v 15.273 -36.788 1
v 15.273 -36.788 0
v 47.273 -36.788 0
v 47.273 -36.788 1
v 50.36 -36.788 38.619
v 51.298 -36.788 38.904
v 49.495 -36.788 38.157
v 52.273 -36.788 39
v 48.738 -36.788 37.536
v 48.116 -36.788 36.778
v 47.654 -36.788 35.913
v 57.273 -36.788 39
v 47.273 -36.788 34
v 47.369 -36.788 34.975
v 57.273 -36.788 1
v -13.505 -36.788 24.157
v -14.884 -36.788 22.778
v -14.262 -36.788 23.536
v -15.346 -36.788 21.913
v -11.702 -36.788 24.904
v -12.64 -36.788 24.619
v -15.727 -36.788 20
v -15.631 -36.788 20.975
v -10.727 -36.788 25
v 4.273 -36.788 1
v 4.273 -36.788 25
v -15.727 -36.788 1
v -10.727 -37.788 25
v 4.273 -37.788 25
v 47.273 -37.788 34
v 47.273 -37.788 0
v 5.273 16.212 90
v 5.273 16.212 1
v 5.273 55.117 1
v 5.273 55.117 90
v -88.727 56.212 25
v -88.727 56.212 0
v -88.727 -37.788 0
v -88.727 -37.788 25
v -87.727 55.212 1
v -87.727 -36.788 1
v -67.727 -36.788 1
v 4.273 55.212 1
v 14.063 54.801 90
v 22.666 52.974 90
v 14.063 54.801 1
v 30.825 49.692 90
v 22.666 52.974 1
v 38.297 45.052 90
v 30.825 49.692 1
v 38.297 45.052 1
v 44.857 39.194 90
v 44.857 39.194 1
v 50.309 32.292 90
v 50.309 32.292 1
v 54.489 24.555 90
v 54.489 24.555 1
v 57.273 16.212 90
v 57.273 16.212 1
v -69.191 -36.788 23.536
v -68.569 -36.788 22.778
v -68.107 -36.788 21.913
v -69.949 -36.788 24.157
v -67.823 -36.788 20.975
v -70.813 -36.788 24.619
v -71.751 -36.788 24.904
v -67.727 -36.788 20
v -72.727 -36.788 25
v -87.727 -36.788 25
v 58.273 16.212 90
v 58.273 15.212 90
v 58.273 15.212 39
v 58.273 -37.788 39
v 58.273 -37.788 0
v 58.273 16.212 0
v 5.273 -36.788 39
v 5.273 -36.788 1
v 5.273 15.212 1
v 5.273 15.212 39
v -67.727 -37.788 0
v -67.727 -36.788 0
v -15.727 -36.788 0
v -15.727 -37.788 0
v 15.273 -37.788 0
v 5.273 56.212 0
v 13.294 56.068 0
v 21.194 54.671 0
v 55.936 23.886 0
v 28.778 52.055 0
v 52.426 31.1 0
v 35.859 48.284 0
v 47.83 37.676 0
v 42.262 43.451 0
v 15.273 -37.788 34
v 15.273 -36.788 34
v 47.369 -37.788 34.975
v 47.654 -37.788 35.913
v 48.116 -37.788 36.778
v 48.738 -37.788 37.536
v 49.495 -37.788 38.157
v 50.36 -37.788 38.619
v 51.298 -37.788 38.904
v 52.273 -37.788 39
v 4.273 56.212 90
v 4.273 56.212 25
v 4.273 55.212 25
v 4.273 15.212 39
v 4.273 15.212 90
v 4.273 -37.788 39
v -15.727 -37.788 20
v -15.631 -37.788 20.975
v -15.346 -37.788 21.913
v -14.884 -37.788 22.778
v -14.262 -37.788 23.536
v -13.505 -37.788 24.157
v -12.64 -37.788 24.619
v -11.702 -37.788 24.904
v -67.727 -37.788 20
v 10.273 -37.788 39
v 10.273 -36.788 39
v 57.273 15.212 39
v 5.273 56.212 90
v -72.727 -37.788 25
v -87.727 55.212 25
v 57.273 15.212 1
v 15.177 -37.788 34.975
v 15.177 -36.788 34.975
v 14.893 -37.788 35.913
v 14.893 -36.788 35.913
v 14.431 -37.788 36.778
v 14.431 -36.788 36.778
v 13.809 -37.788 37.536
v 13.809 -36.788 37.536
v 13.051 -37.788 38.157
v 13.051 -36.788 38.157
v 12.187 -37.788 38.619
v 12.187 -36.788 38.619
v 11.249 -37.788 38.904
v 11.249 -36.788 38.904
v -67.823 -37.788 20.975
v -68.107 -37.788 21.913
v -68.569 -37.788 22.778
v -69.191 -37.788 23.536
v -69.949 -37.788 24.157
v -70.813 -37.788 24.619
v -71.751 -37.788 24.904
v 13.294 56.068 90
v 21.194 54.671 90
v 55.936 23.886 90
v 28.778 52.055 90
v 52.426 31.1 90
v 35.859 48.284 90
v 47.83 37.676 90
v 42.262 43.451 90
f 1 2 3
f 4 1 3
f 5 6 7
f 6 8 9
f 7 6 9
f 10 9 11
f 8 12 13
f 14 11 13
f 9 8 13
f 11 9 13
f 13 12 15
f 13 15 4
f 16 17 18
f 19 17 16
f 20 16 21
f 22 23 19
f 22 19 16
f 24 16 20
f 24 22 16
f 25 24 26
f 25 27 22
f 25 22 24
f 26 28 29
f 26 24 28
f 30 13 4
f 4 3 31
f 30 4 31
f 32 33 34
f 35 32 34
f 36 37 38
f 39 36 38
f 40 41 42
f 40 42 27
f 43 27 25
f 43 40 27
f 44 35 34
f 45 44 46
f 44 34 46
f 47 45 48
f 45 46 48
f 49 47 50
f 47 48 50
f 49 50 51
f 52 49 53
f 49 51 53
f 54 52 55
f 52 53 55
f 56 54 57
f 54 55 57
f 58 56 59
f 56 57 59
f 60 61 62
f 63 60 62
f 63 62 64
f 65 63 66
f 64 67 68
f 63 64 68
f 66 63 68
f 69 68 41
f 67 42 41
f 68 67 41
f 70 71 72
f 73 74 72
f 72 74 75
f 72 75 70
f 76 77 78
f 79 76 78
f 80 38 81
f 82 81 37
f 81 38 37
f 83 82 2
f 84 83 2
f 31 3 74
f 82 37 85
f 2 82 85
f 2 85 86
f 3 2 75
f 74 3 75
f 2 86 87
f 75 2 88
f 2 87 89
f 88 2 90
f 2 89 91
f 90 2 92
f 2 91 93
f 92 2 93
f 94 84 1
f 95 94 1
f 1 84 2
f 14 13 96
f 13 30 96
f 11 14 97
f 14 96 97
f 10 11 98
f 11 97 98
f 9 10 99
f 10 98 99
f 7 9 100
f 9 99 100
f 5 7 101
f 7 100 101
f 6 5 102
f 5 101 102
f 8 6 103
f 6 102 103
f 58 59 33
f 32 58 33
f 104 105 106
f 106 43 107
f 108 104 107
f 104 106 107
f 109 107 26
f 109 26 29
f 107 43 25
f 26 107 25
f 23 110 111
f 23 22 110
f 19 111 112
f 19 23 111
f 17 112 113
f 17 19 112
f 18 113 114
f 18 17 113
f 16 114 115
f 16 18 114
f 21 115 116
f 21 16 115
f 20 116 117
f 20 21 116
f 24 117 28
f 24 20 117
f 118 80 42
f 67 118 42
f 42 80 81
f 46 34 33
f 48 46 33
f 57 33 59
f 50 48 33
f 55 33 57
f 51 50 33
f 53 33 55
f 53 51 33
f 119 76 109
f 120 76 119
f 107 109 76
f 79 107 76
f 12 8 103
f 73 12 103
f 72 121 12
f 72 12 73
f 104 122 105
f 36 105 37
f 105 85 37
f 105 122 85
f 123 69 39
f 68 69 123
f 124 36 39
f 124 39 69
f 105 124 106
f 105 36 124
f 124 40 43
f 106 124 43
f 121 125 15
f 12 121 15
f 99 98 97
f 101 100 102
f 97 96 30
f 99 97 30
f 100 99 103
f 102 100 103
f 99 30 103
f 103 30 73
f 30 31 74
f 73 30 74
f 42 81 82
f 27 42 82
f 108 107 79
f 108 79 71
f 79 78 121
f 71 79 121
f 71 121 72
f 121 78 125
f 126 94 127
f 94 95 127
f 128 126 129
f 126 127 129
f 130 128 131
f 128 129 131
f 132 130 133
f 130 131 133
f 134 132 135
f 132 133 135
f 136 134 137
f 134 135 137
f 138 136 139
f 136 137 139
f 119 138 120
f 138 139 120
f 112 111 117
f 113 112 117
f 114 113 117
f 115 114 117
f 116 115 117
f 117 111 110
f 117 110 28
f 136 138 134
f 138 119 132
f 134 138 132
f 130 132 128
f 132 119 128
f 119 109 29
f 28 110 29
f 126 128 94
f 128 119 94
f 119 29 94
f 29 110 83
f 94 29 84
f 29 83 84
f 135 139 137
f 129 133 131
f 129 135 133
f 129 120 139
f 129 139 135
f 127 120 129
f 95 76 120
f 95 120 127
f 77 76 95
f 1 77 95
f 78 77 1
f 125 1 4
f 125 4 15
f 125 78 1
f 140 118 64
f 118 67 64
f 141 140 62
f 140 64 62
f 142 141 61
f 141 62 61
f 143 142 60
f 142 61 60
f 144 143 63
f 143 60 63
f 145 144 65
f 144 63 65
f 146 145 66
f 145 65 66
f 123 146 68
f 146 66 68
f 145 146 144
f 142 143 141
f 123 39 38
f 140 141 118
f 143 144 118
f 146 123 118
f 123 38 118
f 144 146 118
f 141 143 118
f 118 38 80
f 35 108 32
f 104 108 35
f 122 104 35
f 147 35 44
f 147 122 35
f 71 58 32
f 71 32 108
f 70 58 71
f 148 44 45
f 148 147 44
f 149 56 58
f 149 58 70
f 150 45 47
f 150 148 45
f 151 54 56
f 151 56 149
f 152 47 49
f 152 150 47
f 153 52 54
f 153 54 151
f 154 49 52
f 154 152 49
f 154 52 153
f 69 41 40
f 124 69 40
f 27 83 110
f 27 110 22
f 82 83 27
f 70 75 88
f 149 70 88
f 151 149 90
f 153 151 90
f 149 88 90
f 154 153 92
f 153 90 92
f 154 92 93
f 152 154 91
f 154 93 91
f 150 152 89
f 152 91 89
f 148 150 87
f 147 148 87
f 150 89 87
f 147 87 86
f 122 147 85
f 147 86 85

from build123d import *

# Parameters (mm, degrees)
F1_DEPTH = 90
F0_W     = 10
F0_H     = 1
F2_DEPTH = 39
F0_W_2   = 20
F3_DEPTH = 25
F4_DEPTH = 1
F5_R     = 5
F6_R     = 5
F7_R     = 5
F8_R     = 5


with BuildPart() as f1:
    # F0 (on Top) → F1 (new body)
    with BuildSketch(Plane.XY):
        with BuildLine():
            ThreePointArc((58.273254, 16.21197), (39.155261, 45.99313), (5.273254, 56.21197))
            Line((5.273254, 56.21197), (5.273254, 55.117212))
            ThreePointArc((5.273254, 55.117212), (38.296792, 45.052118), (57.273254, 16.21197))
            Line((57.273254, 16.21197), (58.273254, 16.21197))
        make_face()
        Polygon((5.273254, 16.21197), (5.273254, 15.21197), (57.273254, 15.21197), (58.273254, 15.21197), (58.273254, 16.21197), (57.273254, 16.21197), align=None)
        Polygon((4.273254, 56.21197), (4.273254, 55.21197), (4.273254, 15.21197), (5.273254, 15.21197), (5.273254, 16.21197), (5.273254, 55.117212), (5.273254, 56.21197), align=None)
    extrude(amount=F1_DEPTH)

    # F0 (on Top) → F2 (join)
    with BuildSketch(Plane.XY):
        Polygon((58.273254, 15.21197), (57.273254, 15.21197), (57.273254, -36.78803), (47.273254, -36.78803), (47.273254, -37.78803), (58.273254, -37.78803), align=None)
        Polygon((5.273254, 15.21197), (4.273254, 15.21197), (4.273254, -36.78803), (4.273254, -37.78803), (5.273254, -37.78803), (5.273254, -36.78803), align=None)
        with Locations((10.273254, -37.28803)):
            Rectangle(F0_W, F0_H)
    extrude(amount=F2_DEPTH)

    # F0 (on Top) → F3 (join)
    with BuildSketch(Plane.XY):
        Polygon((-87.726746, -36.78803), (-87.726746, 55.21197), (4.273254, 55.21197), (4.273254, 56.21197), (-88.726746, 56.21197), (-88.726746, -37.78803), (-67.726746, -37.78803), (-67.726746, -36.78803), align=None)
        with Locations((-5.726746, -37.28803)):
            Rectangle(F0_W_2, F0_H)
    extrude(amount=F3_DEPTH)

    # F0 (on Top) → F4 (join)
    with BuildSketch(Plane.XY):
        Polygon((4.273254, 55.21197), (-87.726746, 55.21197), (-87.726746, -36.78803), (-67.726746, -36.78803), (-15.726746, -36.78803), (4.273254, -36.78803), (4.273254, 15.21197), align=None)
        Polygon((57.273254, 15.21197), (5.273254, 15.21197), (5.273254, -36.78803), (15.273254, -36.78803), (47.273254, -36.78803), (57.273254, -36.78803), align=None)
        with BuildLine():
            Line((5.273254, 55.117212), (5.273254, 16.21197))
            Line((5.273254, 16.21197), (57.273254, 16.21197))
            ThreePointArc((57.273254, 16.21197), (38.296792, 45.052118), (5.273254, 55.117212))
        make_face()
    extrude(amount=F4_DEPTH)

    # F5
    f5_edges = [f1.edges().sort_by_distance(p)[0] for p in [
        (-67.726746, -37.28803, 25),
    ]]
    fillet(f5_edges, radius=F5_R)

    # F6
    f6_edges = [f1.edges().sort_by_distance(p)[0] for p in [
        (-15.726746, -37.28803, 25),
    ]]
    fillet(f6_edges, radius=F6_R)

    # F7
    f7_edges = [f1.edges().sort_by_distance(p)[0] for p in [
        (15.273254, -37.28803, 39),
    ]]
    fillet(f7_edges, radius=F7_R)

    # F8
    f8_edges = [f1.edges().sort_by_distance(p)[0] for p in [
        (47.273254, -37.28803, 39),
    ]]
    fillet(f8_edges, radius=F8_R)


solid = f1.part
